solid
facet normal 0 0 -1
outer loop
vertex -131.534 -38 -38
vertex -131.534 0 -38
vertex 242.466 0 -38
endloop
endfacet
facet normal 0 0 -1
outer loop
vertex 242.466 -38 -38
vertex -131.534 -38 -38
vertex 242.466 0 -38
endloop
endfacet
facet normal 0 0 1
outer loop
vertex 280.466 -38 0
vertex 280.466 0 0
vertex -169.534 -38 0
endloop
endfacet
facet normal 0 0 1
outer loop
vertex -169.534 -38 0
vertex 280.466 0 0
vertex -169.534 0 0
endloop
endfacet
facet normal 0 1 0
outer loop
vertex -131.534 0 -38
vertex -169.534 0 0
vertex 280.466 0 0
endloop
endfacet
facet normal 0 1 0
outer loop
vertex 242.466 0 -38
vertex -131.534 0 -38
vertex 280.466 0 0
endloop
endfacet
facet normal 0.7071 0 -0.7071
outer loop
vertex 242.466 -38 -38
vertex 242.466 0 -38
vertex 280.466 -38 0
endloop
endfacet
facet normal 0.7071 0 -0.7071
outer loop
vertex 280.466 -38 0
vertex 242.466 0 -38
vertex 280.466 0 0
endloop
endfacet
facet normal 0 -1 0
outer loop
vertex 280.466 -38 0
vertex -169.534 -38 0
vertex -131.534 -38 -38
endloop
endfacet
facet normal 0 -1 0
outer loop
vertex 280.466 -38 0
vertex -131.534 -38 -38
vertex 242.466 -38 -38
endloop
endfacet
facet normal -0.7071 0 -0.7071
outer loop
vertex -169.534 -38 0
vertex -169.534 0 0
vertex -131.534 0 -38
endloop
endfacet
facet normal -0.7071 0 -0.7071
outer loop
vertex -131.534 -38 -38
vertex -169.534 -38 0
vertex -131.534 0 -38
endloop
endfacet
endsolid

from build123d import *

# Parameters (mm, degrees)
F1_DEPTH = 38
F2_W     = 38
F2_H     = 374
F3_DEPTH = 38


with BuildPart() as f1:
    # F0 (on Front) → F1 (new body)
    with BuildSketch(Plane.XZ):
        Polygon((280.465763, 0), (-169.534237, 0), (-131.534237, -38), (242.465763, -38), align=None)
    extrude(amount=F1_DEPTH)


with BuildPart() as f3:
    # F2 (on Front) → F3 (new body)
    with BuildSketch(Plane.XZ):
        with Locations((-266.727887, -67.336804)):
            Rectangle(F2_W, F2_H)
    extrude(amount=F3_DEPTH)


solid = f1.part
